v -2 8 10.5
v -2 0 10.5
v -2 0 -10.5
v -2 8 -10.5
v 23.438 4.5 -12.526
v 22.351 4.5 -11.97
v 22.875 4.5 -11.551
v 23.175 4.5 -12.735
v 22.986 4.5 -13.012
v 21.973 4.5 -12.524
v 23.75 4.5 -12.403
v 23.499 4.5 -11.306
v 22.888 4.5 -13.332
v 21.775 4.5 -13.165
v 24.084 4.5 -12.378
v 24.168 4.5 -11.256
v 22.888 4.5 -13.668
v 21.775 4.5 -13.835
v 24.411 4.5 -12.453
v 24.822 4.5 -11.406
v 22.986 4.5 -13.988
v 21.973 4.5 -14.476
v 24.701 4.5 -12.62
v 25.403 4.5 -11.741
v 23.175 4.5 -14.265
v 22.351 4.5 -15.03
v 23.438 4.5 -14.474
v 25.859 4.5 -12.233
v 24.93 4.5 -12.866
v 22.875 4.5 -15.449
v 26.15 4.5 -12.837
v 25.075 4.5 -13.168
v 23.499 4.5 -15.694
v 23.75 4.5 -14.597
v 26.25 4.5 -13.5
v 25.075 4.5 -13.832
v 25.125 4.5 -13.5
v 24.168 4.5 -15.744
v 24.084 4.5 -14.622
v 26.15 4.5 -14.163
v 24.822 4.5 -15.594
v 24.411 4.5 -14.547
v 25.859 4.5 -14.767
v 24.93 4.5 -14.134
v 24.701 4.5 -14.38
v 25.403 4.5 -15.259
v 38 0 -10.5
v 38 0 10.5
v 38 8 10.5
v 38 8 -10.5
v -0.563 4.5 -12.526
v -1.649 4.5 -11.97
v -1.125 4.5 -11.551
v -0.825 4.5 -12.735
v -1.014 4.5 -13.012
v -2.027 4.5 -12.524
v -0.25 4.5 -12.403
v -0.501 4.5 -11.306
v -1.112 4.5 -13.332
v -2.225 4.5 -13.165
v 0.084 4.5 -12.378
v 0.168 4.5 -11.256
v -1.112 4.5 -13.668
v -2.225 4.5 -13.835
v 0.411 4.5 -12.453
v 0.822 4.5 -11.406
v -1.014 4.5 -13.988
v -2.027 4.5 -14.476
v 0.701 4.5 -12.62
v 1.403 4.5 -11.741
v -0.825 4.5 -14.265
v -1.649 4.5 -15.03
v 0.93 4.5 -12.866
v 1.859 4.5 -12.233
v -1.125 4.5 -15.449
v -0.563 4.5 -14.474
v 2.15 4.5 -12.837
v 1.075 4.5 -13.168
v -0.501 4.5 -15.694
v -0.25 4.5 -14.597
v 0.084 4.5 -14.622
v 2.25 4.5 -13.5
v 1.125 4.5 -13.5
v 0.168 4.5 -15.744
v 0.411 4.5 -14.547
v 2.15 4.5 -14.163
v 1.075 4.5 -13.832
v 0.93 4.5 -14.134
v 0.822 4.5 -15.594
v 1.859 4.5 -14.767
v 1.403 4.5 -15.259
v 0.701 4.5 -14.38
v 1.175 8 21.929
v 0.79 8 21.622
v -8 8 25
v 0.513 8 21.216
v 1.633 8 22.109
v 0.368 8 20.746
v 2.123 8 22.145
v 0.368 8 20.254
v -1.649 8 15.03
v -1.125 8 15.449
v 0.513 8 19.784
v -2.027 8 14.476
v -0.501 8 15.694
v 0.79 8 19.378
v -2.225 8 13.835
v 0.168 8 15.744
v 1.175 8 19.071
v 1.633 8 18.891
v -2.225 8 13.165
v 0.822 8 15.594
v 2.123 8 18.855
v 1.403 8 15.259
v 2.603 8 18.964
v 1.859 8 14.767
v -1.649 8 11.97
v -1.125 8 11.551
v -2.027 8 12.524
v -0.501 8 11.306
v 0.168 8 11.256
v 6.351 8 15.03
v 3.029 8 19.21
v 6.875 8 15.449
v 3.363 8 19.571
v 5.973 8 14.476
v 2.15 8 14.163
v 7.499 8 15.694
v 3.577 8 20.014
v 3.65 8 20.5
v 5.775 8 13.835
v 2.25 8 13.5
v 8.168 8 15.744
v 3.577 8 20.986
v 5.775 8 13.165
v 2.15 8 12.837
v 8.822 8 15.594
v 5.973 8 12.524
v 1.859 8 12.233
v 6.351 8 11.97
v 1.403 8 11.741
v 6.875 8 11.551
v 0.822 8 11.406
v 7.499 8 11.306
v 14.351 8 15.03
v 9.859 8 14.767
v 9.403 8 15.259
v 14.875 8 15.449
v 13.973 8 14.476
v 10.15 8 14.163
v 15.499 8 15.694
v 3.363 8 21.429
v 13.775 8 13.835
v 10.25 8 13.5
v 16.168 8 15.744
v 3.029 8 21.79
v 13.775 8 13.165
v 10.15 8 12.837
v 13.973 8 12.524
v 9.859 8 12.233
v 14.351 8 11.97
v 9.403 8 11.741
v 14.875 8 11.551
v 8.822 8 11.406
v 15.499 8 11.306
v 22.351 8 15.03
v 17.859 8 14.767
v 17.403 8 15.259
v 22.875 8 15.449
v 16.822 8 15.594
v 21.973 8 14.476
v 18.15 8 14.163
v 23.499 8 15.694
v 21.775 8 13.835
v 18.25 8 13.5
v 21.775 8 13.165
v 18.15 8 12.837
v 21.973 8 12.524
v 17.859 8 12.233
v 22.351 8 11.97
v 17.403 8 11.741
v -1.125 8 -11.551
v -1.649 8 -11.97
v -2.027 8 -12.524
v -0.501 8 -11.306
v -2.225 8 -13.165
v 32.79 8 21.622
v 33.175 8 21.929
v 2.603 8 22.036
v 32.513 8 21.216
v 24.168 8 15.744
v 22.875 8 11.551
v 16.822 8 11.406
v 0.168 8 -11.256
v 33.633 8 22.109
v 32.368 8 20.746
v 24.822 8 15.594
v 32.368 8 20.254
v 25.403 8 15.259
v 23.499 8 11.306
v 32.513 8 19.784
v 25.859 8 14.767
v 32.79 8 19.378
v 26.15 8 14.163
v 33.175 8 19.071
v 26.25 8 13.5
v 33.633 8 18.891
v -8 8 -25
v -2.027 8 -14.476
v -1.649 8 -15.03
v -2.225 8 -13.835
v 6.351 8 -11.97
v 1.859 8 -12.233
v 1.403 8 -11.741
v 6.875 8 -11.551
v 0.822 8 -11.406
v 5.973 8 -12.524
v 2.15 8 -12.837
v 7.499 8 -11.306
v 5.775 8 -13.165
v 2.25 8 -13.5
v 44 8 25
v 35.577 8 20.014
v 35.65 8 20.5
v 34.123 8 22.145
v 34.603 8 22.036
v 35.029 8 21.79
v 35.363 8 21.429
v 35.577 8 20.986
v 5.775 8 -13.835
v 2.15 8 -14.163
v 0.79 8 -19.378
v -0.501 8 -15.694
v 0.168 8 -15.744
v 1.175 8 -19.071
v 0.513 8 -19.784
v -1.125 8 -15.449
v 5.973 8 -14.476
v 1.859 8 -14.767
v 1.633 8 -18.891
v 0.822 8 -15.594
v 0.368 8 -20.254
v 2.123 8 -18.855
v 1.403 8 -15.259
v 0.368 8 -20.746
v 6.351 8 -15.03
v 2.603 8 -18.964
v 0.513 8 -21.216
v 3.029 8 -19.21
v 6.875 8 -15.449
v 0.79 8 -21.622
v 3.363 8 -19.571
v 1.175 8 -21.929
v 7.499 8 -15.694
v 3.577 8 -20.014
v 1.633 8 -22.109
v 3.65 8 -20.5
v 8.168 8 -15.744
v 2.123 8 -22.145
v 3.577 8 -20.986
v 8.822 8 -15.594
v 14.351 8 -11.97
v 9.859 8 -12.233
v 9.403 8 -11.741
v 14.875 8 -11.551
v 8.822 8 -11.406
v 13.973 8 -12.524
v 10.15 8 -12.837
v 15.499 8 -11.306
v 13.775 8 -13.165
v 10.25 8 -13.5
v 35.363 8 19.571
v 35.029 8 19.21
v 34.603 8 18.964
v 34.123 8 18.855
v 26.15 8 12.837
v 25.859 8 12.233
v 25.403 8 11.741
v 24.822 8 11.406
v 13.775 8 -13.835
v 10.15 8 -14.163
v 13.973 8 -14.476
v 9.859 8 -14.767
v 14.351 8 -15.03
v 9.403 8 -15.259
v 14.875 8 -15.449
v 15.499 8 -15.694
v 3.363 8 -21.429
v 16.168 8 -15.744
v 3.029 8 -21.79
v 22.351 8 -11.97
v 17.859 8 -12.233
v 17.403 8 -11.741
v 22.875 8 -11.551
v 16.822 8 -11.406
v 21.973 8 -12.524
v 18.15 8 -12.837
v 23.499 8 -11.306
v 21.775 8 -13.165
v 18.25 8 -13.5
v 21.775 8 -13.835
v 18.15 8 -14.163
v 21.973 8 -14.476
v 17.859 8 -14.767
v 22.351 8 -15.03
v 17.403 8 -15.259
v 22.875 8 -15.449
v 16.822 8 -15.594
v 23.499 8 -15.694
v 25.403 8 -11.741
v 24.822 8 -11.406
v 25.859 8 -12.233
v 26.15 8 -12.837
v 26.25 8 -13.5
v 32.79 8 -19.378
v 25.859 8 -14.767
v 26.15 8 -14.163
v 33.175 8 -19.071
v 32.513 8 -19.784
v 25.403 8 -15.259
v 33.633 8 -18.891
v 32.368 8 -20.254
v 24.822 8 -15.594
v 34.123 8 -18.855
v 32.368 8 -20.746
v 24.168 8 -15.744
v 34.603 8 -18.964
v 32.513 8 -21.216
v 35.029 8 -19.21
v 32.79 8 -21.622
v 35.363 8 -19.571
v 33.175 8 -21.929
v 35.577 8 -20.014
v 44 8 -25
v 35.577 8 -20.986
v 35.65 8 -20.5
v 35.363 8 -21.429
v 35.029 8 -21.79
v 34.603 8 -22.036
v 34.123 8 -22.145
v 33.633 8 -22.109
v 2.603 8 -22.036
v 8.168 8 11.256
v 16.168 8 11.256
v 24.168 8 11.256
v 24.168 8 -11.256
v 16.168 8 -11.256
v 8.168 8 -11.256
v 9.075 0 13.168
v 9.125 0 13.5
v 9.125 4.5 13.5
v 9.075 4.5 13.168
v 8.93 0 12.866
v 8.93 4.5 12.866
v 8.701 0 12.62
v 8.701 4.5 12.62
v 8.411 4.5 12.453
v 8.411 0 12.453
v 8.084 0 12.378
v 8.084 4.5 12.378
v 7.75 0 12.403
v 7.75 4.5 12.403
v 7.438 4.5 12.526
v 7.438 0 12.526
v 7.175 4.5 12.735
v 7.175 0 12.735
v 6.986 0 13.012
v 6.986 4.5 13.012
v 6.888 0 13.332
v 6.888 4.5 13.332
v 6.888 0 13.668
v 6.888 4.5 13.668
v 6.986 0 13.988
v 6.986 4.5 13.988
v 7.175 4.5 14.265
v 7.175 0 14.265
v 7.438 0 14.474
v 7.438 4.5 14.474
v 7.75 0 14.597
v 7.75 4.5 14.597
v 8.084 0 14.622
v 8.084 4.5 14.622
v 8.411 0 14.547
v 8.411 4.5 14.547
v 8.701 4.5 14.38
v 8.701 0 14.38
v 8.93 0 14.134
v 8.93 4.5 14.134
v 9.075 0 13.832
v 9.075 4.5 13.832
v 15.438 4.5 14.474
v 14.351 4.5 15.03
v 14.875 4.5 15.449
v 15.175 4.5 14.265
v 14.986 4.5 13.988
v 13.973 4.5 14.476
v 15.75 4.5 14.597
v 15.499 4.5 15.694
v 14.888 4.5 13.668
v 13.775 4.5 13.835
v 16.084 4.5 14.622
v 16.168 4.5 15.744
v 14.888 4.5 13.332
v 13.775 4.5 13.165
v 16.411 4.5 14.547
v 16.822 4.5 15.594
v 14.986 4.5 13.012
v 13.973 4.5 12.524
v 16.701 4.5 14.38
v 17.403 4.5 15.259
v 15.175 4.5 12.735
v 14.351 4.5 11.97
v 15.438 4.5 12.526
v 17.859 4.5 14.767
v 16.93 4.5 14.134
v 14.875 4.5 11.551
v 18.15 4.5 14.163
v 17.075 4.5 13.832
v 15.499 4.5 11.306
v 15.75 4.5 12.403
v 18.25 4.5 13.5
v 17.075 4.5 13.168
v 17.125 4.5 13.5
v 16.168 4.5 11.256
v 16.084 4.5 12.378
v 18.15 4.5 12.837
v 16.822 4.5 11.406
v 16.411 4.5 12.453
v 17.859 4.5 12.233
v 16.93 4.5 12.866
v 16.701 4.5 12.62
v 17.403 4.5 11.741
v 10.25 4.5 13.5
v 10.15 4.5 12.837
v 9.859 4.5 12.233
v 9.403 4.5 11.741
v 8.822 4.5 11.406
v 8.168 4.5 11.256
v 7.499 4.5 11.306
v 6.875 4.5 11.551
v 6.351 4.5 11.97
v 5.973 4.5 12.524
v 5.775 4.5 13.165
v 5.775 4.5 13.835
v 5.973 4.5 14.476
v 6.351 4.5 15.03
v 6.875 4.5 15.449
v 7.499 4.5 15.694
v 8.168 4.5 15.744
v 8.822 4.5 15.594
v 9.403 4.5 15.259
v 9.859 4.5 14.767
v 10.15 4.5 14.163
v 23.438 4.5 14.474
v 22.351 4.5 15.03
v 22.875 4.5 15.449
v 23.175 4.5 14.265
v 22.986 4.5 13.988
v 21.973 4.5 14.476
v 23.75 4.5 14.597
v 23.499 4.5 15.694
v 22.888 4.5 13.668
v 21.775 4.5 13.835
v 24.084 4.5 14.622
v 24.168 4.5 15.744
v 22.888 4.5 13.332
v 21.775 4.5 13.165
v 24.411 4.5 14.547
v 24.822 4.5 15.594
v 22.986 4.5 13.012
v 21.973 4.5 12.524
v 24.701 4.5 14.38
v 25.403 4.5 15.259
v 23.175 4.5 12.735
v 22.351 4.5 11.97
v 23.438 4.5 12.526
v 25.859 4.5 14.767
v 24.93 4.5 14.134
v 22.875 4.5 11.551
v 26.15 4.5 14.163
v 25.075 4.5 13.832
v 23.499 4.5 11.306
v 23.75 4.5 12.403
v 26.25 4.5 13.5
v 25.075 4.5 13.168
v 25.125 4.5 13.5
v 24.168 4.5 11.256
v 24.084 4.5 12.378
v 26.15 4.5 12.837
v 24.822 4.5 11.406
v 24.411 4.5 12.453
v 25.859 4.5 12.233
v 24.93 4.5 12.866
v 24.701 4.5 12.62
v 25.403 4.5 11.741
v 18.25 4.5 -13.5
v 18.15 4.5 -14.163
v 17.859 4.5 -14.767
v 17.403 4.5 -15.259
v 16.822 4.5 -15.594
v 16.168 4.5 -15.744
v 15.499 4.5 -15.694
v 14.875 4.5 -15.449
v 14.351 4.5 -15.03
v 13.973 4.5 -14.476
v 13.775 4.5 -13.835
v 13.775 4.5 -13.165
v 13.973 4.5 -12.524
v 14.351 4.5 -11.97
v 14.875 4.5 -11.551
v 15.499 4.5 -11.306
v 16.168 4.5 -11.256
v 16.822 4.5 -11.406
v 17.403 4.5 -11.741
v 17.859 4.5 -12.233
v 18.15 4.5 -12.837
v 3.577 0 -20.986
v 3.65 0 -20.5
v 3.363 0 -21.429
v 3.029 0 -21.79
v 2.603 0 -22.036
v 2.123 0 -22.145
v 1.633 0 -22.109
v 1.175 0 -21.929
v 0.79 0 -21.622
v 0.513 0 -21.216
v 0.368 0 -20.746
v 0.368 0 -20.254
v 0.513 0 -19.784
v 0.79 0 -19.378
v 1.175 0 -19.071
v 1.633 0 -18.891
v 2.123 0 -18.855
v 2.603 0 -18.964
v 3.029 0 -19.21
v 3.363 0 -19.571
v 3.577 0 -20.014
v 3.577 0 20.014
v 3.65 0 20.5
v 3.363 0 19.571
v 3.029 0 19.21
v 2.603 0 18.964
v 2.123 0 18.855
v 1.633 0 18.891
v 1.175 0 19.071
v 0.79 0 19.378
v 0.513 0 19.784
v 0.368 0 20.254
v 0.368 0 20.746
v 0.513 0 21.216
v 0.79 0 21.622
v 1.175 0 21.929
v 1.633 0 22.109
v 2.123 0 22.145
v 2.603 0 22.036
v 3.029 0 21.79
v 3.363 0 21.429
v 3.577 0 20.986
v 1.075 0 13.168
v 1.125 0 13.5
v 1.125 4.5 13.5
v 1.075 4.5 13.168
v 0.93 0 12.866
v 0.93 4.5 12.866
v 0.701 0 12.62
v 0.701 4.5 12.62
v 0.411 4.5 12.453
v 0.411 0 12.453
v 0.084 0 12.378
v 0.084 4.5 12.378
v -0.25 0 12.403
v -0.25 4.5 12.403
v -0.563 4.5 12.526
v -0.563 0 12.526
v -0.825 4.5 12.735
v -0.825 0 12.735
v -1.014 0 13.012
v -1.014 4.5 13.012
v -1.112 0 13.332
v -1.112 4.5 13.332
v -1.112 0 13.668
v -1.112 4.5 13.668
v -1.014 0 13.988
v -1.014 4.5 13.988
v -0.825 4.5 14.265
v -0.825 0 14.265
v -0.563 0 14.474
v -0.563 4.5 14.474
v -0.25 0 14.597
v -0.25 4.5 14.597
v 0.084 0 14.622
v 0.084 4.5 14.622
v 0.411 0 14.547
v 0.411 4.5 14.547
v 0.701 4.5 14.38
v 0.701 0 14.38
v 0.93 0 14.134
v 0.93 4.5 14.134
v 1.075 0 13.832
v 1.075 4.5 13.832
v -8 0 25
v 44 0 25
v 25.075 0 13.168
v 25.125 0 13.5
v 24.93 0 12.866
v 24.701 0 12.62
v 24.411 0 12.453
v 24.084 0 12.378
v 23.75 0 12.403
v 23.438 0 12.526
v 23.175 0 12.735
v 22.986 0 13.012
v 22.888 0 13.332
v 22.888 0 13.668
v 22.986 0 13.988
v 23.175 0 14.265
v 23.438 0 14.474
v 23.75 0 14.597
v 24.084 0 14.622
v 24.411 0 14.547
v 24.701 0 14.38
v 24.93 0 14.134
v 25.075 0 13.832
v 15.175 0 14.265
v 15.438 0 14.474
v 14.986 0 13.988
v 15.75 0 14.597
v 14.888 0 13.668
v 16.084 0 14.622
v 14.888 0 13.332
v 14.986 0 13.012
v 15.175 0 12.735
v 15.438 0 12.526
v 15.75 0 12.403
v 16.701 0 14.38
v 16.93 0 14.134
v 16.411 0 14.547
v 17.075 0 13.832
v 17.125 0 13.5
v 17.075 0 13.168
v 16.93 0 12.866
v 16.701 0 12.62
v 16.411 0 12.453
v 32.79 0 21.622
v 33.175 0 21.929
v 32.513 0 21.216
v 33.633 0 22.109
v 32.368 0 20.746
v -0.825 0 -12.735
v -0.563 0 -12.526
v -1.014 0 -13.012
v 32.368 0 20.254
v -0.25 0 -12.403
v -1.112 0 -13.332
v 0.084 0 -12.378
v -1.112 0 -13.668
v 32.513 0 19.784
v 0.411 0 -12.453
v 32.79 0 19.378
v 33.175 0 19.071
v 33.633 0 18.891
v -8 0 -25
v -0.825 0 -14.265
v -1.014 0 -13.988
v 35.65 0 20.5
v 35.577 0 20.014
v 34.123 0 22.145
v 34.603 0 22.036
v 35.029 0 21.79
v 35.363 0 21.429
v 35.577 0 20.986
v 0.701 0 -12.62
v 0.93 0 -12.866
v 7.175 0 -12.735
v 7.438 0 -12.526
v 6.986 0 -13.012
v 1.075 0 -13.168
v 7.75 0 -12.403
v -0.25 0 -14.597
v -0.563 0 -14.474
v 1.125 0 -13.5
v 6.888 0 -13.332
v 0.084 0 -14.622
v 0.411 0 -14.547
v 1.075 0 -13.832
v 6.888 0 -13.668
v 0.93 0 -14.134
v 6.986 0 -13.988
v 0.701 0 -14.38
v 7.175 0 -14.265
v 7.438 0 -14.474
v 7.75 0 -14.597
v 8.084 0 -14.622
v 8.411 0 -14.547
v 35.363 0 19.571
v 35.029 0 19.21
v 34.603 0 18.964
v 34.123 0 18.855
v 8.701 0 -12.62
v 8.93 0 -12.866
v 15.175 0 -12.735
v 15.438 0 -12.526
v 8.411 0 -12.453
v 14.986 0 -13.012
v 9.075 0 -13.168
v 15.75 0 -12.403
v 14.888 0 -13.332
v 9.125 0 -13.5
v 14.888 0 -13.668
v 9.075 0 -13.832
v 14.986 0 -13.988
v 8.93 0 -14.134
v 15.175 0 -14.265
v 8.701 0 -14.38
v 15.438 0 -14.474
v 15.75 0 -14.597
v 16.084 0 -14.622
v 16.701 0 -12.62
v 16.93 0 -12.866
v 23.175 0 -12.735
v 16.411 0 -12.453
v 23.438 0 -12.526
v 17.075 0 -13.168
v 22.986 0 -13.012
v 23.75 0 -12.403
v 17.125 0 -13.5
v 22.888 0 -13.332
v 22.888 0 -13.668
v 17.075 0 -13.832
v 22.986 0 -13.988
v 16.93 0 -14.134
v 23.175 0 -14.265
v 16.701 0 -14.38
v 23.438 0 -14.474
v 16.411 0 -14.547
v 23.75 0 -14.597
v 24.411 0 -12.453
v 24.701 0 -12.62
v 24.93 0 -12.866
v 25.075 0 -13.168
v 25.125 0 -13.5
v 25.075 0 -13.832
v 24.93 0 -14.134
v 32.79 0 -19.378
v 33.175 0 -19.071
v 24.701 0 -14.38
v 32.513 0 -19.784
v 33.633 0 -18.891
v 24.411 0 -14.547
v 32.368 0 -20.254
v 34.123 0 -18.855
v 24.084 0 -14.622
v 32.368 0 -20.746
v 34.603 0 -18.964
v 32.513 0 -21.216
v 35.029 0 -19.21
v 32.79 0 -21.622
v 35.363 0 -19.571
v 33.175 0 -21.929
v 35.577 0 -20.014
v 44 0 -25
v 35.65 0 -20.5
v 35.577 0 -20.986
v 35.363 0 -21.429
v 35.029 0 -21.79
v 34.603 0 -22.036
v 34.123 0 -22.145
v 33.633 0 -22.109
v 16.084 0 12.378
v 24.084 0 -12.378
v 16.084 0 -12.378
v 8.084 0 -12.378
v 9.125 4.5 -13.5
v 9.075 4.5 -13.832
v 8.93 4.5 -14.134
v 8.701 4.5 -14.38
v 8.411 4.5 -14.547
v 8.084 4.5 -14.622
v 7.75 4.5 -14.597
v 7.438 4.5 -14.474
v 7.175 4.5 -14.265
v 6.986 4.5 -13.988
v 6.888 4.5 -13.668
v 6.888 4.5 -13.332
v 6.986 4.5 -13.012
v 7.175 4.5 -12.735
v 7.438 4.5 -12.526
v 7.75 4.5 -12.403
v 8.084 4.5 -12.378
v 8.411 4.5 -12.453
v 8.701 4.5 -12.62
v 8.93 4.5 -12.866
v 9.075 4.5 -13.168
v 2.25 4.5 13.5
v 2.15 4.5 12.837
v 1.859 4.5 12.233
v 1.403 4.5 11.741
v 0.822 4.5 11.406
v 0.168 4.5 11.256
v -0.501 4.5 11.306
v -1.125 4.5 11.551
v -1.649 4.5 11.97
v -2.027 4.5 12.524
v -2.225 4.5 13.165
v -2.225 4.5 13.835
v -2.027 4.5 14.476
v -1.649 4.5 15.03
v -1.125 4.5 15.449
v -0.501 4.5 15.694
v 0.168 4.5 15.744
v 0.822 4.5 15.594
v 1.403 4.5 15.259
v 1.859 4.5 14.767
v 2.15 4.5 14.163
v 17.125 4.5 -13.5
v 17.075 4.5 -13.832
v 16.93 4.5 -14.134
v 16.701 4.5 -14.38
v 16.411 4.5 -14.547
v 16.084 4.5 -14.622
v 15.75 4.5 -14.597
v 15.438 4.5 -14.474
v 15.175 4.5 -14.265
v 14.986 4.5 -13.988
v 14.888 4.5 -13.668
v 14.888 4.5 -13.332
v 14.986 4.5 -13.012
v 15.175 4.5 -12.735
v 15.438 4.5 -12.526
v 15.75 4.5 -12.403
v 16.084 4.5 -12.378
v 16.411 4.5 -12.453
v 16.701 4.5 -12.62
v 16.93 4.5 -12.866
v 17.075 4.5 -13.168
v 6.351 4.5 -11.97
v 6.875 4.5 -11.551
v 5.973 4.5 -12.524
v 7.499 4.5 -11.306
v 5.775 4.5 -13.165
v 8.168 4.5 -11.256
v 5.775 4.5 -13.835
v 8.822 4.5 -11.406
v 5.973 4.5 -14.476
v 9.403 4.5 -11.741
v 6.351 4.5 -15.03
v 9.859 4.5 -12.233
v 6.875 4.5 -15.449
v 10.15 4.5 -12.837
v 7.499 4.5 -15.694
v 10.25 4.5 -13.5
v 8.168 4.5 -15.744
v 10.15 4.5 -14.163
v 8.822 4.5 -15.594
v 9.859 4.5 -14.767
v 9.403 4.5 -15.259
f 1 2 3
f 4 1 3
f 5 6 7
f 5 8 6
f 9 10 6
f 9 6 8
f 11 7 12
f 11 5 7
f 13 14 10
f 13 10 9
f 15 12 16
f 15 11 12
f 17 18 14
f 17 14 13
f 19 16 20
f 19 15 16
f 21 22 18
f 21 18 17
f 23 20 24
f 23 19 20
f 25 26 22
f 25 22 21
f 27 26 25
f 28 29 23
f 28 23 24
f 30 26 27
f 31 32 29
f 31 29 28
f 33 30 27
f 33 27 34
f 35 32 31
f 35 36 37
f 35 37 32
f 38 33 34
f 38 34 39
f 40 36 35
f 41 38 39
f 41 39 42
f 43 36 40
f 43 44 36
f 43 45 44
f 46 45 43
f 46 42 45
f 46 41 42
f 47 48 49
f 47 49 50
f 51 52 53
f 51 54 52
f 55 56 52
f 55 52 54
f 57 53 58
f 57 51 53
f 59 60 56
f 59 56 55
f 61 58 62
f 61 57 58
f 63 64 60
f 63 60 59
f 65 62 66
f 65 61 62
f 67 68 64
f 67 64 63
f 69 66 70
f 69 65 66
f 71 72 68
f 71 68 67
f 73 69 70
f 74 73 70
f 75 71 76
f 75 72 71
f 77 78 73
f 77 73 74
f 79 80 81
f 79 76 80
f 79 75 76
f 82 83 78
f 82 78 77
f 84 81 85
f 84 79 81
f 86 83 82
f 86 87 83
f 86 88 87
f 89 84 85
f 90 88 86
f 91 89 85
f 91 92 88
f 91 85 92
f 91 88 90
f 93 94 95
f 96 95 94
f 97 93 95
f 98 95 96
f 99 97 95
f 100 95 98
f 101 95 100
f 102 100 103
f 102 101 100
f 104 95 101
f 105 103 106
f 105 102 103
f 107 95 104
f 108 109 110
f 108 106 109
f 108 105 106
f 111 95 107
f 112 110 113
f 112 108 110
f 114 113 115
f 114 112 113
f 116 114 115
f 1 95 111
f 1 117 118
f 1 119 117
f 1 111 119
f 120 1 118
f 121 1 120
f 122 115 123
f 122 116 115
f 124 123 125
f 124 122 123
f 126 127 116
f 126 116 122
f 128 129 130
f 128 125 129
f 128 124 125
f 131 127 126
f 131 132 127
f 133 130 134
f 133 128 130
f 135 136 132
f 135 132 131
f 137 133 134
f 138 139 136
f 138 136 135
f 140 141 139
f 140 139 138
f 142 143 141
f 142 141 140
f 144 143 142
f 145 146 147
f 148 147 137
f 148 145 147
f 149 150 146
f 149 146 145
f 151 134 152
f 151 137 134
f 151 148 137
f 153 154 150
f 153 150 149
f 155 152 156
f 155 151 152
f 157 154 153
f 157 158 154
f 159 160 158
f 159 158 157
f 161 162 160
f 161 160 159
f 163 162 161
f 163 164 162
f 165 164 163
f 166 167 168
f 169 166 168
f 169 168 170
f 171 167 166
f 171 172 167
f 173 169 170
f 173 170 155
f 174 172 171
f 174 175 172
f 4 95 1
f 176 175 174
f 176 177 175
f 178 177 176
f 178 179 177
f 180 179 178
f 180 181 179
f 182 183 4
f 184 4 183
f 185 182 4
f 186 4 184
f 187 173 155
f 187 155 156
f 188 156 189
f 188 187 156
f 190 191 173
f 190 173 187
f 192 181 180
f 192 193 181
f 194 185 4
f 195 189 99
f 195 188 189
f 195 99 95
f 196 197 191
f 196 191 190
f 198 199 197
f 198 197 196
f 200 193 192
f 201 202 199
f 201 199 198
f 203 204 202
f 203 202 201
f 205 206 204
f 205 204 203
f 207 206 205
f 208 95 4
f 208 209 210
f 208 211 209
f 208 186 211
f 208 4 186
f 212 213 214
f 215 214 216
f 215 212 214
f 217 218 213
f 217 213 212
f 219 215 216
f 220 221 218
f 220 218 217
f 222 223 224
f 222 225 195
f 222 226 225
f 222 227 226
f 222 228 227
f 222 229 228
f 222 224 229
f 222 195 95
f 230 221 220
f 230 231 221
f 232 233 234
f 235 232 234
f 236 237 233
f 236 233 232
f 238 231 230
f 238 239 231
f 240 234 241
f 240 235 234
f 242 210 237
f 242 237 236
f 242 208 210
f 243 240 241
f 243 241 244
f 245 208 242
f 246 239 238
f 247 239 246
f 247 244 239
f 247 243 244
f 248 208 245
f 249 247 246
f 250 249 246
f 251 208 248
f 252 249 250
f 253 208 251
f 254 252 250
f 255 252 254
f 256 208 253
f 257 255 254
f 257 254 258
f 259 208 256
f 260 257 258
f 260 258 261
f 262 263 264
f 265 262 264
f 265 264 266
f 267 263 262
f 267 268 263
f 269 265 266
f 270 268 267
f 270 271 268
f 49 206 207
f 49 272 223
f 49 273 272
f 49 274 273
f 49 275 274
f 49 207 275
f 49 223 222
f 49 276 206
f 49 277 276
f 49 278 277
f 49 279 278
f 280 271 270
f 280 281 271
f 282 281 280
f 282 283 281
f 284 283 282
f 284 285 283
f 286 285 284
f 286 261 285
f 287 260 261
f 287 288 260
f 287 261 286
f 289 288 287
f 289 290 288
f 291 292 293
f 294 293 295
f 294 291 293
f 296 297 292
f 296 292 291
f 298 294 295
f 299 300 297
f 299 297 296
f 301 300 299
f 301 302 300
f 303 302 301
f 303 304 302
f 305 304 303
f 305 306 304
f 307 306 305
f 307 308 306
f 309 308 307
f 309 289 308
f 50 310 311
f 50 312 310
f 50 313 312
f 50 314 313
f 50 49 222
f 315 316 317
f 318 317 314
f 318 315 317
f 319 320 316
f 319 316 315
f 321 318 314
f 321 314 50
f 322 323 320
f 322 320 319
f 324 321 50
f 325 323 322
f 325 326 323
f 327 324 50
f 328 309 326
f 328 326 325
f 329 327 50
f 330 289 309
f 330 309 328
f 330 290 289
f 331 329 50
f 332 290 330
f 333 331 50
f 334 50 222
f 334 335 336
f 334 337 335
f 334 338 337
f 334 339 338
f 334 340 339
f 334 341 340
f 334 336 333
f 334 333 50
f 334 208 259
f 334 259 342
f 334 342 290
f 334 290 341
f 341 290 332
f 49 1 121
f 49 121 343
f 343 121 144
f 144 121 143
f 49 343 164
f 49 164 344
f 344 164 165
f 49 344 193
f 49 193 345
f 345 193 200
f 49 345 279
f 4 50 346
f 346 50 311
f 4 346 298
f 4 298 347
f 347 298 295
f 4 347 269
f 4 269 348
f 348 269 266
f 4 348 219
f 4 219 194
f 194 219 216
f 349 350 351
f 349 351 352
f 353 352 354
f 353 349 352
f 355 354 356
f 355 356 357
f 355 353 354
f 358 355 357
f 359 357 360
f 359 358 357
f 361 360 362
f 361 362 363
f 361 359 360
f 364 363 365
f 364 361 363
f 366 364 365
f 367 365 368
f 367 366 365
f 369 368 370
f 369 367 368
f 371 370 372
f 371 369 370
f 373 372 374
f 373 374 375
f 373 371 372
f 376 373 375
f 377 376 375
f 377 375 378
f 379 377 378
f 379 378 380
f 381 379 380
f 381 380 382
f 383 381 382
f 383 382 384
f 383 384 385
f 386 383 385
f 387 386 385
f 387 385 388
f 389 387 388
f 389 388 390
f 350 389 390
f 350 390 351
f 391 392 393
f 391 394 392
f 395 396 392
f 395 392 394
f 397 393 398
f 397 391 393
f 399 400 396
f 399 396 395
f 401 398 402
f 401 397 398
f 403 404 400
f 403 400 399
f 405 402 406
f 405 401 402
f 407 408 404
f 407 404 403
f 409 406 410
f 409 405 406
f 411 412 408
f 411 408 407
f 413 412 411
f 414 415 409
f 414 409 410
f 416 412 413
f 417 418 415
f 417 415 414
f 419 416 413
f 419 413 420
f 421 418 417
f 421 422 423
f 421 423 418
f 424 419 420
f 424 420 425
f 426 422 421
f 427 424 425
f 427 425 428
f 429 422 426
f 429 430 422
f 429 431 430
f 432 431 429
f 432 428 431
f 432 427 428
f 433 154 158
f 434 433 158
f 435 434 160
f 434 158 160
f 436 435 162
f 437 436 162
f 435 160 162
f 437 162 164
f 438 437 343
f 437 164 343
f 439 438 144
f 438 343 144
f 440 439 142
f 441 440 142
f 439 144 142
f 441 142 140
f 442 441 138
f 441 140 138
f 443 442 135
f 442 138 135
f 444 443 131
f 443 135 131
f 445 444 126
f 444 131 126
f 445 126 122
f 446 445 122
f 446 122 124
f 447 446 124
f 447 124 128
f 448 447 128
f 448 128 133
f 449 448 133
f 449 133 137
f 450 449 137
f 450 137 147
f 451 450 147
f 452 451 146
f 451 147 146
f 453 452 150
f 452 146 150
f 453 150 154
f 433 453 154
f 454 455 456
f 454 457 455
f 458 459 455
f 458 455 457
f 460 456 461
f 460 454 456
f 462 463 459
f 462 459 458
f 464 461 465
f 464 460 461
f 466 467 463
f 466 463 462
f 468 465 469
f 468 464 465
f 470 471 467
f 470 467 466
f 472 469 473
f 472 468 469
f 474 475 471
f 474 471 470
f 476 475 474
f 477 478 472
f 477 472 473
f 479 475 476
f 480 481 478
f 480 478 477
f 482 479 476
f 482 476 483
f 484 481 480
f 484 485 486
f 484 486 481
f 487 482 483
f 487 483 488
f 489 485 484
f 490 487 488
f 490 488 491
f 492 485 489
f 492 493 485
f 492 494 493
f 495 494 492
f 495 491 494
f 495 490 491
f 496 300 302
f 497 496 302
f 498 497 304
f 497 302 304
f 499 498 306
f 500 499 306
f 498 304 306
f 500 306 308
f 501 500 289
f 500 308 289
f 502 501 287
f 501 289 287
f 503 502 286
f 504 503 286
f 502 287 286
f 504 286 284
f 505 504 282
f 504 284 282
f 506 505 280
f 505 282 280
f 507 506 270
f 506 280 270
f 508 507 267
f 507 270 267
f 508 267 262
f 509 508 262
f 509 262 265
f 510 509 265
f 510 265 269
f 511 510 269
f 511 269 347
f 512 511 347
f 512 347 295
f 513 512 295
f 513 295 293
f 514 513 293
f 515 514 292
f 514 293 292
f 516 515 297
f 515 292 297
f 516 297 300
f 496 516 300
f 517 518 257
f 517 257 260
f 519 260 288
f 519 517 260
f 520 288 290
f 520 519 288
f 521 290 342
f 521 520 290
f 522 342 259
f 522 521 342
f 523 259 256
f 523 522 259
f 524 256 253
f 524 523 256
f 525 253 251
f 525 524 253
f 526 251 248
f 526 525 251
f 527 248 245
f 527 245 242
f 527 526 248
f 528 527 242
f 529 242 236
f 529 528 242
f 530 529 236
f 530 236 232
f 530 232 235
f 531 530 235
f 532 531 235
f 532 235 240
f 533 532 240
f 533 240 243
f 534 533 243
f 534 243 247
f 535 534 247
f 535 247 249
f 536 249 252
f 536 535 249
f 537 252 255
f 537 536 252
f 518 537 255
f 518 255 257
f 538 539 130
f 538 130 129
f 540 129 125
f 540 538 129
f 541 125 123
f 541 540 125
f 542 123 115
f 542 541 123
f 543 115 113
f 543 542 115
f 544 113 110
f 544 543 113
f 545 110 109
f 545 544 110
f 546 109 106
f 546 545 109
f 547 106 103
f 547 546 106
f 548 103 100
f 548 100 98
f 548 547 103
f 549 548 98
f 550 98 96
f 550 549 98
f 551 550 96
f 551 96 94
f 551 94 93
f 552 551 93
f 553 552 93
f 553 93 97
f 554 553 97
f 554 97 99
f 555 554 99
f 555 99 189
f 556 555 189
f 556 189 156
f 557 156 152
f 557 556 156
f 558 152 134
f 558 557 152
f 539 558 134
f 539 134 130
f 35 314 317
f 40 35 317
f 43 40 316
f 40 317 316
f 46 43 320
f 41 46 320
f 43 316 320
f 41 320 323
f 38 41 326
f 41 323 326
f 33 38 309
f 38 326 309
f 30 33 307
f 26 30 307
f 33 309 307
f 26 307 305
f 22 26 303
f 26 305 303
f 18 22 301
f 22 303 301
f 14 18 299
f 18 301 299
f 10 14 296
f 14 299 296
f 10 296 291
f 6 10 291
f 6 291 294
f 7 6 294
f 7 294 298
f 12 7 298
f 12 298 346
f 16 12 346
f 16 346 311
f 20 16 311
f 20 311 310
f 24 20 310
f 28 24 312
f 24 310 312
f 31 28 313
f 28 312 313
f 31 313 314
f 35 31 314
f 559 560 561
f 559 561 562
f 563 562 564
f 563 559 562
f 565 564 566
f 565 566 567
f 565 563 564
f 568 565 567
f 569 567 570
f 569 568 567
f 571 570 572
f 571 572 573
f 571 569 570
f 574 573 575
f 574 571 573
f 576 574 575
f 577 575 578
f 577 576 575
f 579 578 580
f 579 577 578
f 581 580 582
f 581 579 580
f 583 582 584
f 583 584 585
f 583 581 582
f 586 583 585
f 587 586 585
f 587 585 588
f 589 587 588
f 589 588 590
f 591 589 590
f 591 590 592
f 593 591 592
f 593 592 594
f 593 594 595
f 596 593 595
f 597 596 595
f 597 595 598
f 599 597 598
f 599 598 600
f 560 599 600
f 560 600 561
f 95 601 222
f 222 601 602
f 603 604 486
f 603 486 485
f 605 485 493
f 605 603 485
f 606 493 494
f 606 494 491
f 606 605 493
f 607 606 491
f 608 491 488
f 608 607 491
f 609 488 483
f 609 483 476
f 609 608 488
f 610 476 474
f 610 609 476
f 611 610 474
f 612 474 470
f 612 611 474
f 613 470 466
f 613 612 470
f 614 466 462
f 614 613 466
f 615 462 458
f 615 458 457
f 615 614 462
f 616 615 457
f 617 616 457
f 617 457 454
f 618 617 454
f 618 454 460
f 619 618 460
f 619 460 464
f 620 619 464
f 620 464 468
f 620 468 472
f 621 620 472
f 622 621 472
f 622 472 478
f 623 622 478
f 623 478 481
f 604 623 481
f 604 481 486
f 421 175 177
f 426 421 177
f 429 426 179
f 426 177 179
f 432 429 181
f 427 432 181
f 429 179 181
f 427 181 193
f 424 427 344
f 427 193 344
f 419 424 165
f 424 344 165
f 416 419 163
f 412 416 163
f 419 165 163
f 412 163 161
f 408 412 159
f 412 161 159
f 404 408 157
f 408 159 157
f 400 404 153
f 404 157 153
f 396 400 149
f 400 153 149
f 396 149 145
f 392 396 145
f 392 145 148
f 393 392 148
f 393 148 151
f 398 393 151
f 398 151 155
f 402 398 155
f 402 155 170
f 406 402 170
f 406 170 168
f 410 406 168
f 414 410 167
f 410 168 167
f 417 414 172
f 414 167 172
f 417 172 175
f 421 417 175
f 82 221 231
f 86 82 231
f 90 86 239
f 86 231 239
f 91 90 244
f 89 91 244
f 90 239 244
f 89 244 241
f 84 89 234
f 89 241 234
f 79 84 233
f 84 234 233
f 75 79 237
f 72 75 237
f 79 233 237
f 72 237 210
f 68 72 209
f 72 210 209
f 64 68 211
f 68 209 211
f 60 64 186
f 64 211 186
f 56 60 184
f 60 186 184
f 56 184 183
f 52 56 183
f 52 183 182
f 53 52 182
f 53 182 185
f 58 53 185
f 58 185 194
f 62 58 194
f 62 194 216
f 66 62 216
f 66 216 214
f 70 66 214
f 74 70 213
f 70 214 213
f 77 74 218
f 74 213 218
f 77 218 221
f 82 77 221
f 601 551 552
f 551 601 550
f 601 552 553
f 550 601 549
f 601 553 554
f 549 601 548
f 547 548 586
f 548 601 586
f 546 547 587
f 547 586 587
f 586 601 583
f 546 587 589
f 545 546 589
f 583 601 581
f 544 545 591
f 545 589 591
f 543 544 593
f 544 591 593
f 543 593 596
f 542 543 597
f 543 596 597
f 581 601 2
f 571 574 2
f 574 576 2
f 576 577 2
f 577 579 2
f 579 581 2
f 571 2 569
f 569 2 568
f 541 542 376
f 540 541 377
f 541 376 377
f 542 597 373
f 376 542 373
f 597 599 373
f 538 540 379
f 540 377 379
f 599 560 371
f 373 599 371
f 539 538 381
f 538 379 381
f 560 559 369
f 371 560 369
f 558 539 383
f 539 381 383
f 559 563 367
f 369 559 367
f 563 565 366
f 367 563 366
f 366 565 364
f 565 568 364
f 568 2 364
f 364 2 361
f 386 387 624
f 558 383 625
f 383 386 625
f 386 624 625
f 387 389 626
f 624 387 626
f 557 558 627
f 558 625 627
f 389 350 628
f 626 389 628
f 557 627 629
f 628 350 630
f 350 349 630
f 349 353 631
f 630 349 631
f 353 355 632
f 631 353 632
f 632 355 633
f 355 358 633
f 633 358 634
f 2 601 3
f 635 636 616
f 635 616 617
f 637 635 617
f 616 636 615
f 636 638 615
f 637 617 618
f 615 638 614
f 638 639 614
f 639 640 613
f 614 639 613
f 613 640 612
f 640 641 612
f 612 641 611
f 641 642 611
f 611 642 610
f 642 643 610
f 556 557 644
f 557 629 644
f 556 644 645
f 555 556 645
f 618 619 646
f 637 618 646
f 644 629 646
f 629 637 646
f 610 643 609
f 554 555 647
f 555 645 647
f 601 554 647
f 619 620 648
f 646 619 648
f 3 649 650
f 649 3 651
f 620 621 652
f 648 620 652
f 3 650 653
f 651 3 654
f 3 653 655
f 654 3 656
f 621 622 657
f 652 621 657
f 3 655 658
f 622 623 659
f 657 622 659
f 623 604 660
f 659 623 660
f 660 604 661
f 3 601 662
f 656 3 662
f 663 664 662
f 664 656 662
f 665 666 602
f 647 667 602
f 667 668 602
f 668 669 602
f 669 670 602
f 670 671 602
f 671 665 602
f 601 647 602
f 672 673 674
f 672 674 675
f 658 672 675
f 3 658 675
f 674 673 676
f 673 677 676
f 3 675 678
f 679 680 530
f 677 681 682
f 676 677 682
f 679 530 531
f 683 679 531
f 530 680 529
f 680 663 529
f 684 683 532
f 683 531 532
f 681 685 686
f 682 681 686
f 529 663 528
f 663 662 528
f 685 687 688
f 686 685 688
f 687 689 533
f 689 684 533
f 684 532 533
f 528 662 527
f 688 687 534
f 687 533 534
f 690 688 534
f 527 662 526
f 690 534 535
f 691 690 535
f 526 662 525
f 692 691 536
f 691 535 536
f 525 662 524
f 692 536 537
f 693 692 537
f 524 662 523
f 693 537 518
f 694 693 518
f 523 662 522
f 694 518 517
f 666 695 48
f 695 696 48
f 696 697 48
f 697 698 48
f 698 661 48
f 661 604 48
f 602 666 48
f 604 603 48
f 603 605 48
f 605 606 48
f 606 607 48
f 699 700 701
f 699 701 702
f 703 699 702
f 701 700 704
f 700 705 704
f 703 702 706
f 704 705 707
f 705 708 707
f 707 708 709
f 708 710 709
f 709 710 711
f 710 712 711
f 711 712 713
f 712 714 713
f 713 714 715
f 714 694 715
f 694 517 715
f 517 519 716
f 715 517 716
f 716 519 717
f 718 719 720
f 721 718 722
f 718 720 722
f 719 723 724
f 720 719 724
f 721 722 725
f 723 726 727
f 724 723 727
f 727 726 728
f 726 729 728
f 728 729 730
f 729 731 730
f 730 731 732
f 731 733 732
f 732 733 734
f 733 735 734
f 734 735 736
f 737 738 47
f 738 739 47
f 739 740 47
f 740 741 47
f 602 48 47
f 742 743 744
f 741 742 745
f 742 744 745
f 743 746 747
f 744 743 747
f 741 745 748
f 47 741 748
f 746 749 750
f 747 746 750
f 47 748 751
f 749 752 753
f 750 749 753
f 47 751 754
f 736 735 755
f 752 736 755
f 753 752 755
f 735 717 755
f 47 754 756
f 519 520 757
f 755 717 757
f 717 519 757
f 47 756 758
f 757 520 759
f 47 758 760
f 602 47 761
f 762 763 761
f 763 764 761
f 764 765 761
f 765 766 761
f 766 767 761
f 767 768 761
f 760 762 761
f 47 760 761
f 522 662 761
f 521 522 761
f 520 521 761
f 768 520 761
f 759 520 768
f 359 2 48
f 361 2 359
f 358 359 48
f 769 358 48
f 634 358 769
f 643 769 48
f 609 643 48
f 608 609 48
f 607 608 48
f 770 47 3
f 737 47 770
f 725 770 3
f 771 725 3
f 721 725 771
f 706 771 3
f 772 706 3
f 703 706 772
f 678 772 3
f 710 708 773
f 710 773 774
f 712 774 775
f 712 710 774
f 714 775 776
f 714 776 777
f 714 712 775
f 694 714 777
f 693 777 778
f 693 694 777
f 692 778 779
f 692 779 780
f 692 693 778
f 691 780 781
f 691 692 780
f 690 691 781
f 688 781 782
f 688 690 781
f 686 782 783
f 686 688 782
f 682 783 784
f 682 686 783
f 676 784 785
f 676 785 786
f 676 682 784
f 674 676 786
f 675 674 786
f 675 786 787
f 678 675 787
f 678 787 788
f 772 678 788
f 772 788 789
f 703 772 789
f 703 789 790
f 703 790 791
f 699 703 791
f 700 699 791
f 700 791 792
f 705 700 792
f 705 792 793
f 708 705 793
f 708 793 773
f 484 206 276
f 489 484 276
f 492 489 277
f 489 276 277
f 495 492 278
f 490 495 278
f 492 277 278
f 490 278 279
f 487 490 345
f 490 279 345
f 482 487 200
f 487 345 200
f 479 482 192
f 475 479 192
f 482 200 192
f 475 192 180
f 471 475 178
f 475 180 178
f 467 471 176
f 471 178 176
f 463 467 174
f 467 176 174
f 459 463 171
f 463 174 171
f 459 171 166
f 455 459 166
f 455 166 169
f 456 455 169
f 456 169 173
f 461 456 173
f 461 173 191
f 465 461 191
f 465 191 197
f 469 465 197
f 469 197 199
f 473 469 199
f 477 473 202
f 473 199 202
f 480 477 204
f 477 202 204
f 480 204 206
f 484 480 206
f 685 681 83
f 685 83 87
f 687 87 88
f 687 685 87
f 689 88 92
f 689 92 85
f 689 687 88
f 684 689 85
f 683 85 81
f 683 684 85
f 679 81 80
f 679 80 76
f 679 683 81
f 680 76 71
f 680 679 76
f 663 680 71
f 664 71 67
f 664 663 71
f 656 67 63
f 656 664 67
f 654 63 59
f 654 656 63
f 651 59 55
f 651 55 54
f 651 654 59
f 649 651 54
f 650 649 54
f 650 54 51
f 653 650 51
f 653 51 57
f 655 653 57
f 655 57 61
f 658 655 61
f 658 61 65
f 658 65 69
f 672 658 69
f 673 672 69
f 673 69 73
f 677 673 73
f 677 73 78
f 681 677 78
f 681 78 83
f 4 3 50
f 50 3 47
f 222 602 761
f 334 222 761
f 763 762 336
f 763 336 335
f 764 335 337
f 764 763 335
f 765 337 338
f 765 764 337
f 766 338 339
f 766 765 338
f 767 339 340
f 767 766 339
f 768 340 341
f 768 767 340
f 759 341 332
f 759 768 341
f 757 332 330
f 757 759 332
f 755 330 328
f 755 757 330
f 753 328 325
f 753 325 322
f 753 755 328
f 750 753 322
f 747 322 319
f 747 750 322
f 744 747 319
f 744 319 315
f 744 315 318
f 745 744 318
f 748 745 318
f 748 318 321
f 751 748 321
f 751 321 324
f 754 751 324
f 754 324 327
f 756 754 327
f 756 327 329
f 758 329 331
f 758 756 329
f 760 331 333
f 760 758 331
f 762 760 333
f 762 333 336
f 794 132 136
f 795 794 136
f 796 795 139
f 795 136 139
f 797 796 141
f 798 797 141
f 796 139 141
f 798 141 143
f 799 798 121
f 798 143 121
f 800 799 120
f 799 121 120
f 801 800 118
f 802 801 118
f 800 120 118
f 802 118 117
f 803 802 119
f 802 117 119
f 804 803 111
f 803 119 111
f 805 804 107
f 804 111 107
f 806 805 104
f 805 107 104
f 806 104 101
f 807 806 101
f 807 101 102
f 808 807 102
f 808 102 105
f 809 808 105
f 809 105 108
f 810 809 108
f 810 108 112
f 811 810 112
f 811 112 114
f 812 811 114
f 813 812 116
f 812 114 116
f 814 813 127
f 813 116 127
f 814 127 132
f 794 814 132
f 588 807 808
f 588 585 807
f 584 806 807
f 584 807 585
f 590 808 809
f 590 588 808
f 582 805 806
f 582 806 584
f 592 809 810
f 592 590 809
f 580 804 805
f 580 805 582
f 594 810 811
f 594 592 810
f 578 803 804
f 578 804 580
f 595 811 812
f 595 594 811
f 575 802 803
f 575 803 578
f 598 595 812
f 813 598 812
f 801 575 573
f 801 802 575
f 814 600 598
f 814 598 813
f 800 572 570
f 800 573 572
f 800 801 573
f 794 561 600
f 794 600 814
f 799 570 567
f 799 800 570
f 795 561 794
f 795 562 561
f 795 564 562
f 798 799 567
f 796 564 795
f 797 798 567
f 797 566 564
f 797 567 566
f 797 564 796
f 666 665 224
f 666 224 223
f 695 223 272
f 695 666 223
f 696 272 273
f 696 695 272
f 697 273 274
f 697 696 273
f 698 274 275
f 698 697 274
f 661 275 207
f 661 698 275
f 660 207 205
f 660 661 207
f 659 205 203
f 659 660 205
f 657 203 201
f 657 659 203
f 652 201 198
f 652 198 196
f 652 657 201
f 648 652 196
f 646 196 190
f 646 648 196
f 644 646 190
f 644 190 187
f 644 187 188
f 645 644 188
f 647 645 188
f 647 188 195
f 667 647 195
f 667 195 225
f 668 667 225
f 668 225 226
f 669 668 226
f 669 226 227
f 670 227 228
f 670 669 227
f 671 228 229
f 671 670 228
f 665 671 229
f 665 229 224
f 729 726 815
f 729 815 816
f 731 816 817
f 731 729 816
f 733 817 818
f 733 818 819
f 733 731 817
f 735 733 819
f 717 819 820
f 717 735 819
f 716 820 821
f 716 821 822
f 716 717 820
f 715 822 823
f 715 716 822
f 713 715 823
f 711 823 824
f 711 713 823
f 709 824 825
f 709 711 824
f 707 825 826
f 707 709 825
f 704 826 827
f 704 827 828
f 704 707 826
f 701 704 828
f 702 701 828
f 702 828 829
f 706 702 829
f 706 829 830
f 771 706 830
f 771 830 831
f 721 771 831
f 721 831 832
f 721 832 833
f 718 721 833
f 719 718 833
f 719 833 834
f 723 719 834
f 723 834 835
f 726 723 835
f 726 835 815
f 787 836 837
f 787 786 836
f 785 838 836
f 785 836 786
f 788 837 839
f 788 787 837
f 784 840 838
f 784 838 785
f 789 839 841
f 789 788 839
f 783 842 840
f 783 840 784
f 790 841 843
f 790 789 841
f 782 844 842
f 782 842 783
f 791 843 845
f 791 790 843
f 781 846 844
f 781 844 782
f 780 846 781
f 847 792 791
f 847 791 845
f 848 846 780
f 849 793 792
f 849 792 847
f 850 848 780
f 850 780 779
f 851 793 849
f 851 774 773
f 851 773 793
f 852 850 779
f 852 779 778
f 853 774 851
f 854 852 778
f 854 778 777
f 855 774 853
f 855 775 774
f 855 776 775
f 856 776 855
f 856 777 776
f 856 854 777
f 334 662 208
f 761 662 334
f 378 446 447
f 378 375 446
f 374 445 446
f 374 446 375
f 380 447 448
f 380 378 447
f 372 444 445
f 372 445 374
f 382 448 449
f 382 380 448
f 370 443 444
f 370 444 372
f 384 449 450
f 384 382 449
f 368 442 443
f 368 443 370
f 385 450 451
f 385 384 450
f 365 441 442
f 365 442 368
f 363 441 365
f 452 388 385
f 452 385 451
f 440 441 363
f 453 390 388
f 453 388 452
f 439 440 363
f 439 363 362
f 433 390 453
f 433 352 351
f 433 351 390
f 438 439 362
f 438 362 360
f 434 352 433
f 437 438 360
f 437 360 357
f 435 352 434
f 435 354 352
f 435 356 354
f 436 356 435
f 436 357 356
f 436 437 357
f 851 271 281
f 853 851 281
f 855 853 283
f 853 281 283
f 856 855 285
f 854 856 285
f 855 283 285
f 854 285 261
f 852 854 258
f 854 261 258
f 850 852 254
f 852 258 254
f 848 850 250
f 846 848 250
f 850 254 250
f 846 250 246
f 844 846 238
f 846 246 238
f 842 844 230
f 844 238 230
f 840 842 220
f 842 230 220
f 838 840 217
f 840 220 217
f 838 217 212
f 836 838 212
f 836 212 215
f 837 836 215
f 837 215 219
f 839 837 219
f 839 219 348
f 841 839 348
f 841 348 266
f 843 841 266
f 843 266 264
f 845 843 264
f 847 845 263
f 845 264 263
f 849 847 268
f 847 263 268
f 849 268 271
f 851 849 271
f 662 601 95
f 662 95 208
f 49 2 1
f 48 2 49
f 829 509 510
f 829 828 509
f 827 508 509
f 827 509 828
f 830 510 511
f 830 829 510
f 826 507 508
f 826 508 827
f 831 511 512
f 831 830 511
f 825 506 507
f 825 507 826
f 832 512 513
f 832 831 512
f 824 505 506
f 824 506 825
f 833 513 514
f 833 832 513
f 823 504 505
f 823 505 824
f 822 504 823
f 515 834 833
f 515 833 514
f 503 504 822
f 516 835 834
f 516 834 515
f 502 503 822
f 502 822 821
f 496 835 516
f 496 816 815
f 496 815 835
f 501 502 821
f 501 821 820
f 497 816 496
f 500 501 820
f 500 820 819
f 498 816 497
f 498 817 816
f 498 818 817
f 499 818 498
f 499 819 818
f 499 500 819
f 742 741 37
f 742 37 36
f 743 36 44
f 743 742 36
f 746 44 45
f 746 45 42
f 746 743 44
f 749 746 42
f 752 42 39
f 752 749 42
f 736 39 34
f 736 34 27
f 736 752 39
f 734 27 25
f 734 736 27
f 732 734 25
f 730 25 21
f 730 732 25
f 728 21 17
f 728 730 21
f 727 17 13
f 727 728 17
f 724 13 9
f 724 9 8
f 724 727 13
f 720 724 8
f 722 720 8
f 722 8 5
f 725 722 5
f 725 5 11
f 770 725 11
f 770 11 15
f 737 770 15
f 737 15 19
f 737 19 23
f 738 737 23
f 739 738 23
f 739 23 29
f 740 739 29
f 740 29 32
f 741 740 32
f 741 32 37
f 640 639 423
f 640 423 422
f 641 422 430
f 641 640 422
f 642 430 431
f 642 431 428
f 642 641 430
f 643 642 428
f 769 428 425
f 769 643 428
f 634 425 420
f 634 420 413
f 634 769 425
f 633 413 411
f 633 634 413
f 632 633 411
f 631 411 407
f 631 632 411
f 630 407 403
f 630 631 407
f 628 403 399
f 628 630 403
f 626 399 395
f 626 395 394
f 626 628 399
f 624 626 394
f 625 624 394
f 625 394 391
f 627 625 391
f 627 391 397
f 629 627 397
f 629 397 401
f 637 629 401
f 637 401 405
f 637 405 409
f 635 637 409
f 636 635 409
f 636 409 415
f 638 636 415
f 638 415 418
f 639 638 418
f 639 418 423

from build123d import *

# Parameters (mm, degrees)
SKETCH1_W           = 52
SKETCH1_H           = 50
SKETCH1_R           = 1.125
SKETCH1_R_2         = 1.65
SKETCH1_W_2         = 40
SKETCH1_H_2         = 21
BOSS_EXTRUDE1_DEPTH = 8
SKETCH2_R           = 2.25
SKETCH2_R_2         = 1.125
CUT_EXTRUDE1_DEPTH  = 3.5


with BuildPart() as part:
    # Sketch1 → Boss-Extrude1 (new body)
    with BuildSketch(Plane(origin=(0, 0, 0), x_dir=(1, 0, 0), z_dir=(0, 1, 0))):
        with Locations((18, 0)):
            Rectangle(SKETCH1_W, SKETCH1_H)
        with Locations((0, 13.5)):
            Circle(SKETCH1_R, mode=Mode.SUBTRACT)
        with Locations((8, 13.5)):
            Circle(SKETCH1_R, mode=Mode.SUBTRACT)
        with Locations((16, 13.5)):
            Circle(SKETCH1_R, mode=Mode.SUBTRACT)
        with Locations((24, 13.5)):
            Circle(SKETCH1_R, mode=Mode.SUBTRACT)
        with Locations((24, -13.5)):
            Circle(SKETCH1_R, mode=Mode.SUBTRACT)
        with Locations((16, -13.5)):
            Circle(SKETCH1_R, mode=Mode.SUBTRACT)
        with Locations((8, -13.5)):
            Circle(SKETCH1_R, mode=Mode.SUBTRACT)
        with Locations((0, -13.5)):
            Circle(SKETCH1_R, mode=Mode.SUBTRACT)
        with Locations((34, 20.5)):
            Circle(SKETCH1_R_2, mode=Mode.SUBTRACT)
        with Locations((2, 20.5)):
            Circle(SKETCH1_R_2, mode=Mode.SUBTRACT)
        with Locations((34, -20.5)):
            Circle(SKETCH1_R_2, mode=Mode.SUBTRACT)
        with Locations((2, -20.5)):
            Circle(SKETCH1_R_2, mode=Mode.SUBTRACT)
        with Locations((18, 0)):
            Rectangle(SKETCH1_W_2, SKETCH1_H_2, mode=Mode.SUBTRACT)
    extrude(amount=BOSS_EXTRUDE1_DEPTH)

    # Sketch2 → Cut-Extrude1 (cut)
    with BuildSketch(Plane(origin=(0, 8, 0), x_dir=(1, 0, 0), z_dir=(0, 1, 0))):
        with Locations((0, 13.5)):
            Circle(SKETCH2_R)
        with Locations((0, 13.5)):
            Circle(SKETCH2_R_2, mode=Mode.SUBTRACT)
        with Locations((8, 13.5)):
            Circle(SKETCH2_R)
        with Locations((8, 13.5)):
            Circle(SKETCH2_R_2, mode=Mode.SUBTRACT)
        with Locations((16, 13.5)):
            Circle(SKETCH2_R)
        with Locations((16, 13.5)):
            Circle(SKETCH2_R_2, mode=Mode.SUBTRACT)
        with Locations((24, 13.5)):
            Circle(SKETCH2_R)
        with Locations((24, 13.5)):
            Circle(SKETCH2_R_2, mode=Mode.SUBTRACT)
        with Locations((24, -13.5)):
            Circle(SKETCH2_R)
        with Locations((24, -13.5)):
            Circle(SKETCH2_R_2, mode=Mode.SUBTRACT)
        with Locations((16, -13.5)):
            Circle(SKETCH2_R)
        with Locations((16, -13.5)):
            Circle(SKETCH2_R_2, mode=Mode.SUBTRACT)
        with Locations((8, -13.5)):
            Circle(SKETCH2_R)
        with Locations((8, -13.5)):
            Circle(SKETCH2_R_2, mode=Mode.SUBTRACT)
        with Locations((0, -13.5)):
            Circle(SKETCH2_R)
        with Locations((0, -13.5)):
            Circle(SKETCH2_R_2, mode=Mode.SUBTRACT)
    extrude(amount=-CUT_EXTRUDE1_DEPTH, mode=Mode.SUBTRACT)


solid = part.part
